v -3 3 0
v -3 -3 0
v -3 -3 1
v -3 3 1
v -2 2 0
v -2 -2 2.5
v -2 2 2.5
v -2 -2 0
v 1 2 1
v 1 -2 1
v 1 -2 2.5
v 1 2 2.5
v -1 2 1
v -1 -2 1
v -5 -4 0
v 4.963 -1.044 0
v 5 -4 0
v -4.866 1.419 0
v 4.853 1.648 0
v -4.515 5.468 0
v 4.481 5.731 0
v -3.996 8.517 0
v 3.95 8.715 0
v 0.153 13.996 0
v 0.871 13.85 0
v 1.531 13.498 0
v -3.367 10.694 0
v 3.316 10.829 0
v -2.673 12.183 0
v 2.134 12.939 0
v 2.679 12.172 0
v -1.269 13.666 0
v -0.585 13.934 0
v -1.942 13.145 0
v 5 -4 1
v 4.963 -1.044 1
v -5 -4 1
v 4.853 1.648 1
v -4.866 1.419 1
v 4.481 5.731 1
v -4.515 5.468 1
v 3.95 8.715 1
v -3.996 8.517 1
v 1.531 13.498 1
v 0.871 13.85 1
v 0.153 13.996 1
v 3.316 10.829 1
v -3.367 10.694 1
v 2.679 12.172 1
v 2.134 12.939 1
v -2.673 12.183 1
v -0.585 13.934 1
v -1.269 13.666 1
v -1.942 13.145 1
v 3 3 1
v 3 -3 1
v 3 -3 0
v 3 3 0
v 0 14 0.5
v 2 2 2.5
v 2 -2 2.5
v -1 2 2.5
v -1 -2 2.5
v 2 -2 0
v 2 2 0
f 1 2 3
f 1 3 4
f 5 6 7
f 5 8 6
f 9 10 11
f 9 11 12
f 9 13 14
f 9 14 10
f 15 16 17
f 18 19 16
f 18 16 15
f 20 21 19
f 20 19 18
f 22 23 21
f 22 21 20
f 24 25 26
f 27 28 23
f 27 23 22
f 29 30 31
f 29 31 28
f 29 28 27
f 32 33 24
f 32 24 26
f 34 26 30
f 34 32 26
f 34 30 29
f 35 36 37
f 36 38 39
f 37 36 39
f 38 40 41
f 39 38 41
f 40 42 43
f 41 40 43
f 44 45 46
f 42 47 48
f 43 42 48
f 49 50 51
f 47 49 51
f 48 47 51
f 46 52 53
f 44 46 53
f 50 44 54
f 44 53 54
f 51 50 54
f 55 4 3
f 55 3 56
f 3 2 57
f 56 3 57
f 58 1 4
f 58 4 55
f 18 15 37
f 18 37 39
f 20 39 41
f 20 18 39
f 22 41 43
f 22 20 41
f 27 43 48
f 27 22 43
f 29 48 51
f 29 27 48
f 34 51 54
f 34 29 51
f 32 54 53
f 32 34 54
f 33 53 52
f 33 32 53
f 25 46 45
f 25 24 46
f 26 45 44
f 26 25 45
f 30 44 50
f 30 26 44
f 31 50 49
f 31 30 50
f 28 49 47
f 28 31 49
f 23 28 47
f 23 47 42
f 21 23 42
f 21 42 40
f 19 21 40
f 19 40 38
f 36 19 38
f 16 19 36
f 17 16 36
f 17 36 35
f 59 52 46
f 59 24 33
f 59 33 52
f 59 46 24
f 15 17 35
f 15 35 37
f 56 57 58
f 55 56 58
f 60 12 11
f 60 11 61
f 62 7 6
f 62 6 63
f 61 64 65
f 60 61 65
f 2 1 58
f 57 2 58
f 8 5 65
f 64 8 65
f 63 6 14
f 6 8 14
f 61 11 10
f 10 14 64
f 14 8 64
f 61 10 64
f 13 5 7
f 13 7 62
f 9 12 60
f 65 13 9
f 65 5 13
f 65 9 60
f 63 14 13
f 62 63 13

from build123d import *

# Parameters (mm, degrees)
SKETCH_W     = 6
SKETCH_H     = 6
PAD_DEPTH    = 1
PAD003_DEPTH = 1
SKETCH003_W  = 4
SKETCH003_H  = 4
PAD001_DEPTH = 1
SKETCH001_W  = 1
SKETCH001_H  = 4
PAD002_DEPTH = 1.5


with BuildPart() as square:
    # Sketch → Pad (new body)
    with BuildSketch(Plane.XY):
        Rectangle(SKETCH_W, SKETCH_H)
    extrude(amount=PAD_DEPTH)


with BuildPart() as nail:
    # Sketch002 → Pad003 (new body)
    with BuildSketch(Plane.XY):
        with BuildLine():
            add(Edge.make_bspline(
                [(-5, -4), (-5, 14), (0, 14)],
                knots=[0, 0, 0, 1, 1, 1], degree=2))
            add(Edge.make_bspline(
                [(0, 14), (5, 14), (5, -4)],
                knots=[0, 0, 0, 1, 1, 1], degree=2))
            Line((5, -4), (-5, -4))
        make_face()
    extrude(amount=PAD003_DEPTH)


with BuildPart() as connector:
    # Sketch003 → Pad001 (new body)
    with BuildSketch(Plane.XY):
        Rectangle(SKETCH003_W, SKETCH003_H)
    extrude(amount=PAD001_DEPTH)

    # Sketch001 (on Face6 of Pad) → Pad002 (join)
    with BuildSketch(Plane.XY.offset(1)):
        with Locations((-1.5, 0)):
            Rectangle(SKETCH001_W, SKETCH001_H)
        with Locations((1.5, 0)):
            Rectangle(SKETCH001_W, SKETCH001_H)
    extrude(amount=PAD002_DEPTH)


solid = Compound([square.part, nail.part, connector.part])
